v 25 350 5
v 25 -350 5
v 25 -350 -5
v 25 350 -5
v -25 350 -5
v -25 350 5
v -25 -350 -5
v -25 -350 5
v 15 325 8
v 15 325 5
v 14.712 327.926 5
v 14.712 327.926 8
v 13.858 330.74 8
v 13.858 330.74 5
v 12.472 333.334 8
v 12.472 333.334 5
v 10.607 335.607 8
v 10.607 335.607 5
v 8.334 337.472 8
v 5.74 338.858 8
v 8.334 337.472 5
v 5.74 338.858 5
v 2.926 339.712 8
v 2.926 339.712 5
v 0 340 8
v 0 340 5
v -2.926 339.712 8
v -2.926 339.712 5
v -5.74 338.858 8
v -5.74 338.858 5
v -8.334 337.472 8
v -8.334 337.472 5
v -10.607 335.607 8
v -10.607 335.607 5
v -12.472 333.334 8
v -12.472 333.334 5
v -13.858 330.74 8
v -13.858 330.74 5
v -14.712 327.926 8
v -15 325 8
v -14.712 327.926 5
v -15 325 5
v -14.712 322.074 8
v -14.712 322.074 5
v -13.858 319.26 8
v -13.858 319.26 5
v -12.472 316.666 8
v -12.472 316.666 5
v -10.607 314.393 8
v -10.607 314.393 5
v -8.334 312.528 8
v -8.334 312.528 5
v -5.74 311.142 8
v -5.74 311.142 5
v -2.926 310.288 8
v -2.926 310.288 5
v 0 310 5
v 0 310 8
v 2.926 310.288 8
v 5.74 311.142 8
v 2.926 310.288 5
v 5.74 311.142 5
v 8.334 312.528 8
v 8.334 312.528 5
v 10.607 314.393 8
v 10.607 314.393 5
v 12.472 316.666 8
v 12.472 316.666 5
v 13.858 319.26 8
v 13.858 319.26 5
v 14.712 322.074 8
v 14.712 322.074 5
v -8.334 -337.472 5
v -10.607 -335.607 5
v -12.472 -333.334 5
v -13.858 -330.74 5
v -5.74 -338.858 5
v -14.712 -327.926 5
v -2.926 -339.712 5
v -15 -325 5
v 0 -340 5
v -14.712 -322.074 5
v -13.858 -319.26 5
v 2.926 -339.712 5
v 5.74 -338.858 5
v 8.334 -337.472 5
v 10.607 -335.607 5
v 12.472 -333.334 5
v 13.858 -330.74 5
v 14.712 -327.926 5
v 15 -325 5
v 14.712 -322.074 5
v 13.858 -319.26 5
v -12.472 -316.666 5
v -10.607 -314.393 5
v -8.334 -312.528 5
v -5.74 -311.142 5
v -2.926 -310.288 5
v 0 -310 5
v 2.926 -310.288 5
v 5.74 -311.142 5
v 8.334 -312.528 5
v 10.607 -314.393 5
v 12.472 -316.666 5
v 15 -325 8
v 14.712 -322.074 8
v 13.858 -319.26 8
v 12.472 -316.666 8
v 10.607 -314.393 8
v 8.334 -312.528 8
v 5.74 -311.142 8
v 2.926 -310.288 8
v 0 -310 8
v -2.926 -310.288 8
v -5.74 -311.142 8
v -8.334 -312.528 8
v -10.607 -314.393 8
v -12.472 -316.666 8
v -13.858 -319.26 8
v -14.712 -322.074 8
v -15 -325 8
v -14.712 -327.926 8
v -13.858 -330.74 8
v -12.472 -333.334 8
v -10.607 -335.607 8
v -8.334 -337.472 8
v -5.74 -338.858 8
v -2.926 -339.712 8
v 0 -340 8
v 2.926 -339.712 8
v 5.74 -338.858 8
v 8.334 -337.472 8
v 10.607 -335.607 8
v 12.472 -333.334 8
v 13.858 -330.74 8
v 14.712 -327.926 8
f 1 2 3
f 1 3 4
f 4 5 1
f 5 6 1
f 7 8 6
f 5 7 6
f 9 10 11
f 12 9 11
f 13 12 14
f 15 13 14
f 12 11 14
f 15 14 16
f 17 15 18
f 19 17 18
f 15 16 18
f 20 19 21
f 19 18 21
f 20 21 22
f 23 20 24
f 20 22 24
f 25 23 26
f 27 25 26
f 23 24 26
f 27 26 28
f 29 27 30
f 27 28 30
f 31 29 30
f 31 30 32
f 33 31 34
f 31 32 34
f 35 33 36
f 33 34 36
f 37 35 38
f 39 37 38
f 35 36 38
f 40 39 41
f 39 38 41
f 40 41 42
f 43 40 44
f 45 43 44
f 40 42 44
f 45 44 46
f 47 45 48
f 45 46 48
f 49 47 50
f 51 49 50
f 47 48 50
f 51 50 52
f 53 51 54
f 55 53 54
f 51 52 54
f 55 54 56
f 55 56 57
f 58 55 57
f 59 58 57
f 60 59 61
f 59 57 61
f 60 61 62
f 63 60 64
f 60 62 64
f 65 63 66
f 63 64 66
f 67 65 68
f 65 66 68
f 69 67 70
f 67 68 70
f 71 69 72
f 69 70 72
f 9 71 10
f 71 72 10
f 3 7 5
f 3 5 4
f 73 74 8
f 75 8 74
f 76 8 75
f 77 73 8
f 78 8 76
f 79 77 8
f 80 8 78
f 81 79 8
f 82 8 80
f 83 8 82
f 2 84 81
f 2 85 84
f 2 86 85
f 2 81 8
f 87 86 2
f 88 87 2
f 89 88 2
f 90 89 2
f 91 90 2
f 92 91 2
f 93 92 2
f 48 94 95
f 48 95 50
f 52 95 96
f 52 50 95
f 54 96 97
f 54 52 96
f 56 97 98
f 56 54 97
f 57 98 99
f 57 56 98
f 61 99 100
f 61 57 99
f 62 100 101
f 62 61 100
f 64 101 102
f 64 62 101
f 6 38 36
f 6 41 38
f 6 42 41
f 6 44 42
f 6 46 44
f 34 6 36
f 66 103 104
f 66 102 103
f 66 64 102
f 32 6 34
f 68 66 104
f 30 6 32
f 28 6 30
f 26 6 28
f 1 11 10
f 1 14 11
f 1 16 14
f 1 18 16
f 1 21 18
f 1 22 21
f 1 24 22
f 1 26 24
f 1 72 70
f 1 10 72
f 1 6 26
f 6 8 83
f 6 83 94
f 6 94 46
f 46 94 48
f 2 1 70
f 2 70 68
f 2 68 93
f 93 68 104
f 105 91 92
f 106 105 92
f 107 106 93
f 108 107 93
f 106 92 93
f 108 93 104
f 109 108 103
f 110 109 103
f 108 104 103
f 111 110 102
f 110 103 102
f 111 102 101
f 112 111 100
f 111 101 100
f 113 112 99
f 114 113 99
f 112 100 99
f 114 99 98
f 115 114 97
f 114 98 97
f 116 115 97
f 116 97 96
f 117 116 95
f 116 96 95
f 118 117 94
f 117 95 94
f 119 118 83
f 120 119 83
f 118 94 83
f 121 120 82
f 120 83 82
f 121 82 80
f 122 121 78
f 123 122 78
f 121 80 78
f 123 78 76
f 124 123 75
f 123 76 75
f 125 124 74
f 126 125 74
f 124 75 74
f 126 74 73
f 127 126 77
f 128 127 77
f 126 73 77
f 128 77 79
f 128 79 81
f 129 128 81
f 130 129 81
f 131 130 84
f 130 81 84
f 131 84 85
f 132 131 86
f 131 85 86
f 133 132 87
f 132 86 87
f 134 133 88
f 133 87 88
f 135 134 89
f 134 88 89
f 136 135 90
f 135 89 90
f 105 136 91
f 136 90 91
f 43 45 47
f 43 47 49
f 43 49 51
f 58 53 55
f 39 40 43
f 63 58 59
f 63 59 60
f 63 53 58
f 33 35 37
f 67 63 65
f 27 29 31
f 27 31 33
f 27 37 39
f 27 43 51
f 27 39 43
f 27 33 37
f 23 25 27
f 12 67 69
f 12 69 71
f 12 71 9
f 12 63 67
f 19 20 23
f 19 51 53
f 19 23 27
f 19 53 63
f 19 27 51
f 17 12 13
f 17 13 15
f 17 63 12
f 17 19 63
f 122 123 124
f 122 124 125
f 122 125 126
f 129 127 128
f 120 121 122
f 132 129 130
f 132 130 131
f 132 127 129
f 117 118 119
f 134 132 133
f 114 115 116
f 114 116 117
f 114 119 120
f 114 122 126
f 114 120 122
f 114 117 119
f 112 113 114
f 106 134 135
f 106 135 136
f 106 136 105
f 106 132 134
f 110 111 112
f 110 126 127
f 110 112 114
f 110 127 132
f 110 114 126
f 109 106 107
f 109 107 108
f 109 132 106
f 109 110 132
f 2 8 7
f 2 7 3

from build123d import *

# Parameters (mm, degrees)
SKETCH1_W           = 50
SKETCH1_H           = 700
BOSS_EXTRUDE1_DEPTH = 5
SKETCH2_R           = 15
BOSS_EXTRUDE2_DEPTH = 3


with BuildPart() as part:
    # Sketch1 → Boss-Extrude1 (new, symmetric)
    with BuildSketch(Plane.XY):
        Rectangle(SKETCH1_W, SKETCH1_H)
    extrude(amount=BOSS_EXTRUDE1_DEPTH, both=True)

    # Sketch2 → Boss-Extrude2 (add)
    with BuildSketch(Plane.XY.offset(5)):
        with Locations((0, -325)):
            Circle(SKETCH2_R)
        with Locations((0, 325)):
            Circle(SKETCH2_R)
    extrude(amount=BOSS_EXTRUDE2_DEPTH)


solid = part.part
